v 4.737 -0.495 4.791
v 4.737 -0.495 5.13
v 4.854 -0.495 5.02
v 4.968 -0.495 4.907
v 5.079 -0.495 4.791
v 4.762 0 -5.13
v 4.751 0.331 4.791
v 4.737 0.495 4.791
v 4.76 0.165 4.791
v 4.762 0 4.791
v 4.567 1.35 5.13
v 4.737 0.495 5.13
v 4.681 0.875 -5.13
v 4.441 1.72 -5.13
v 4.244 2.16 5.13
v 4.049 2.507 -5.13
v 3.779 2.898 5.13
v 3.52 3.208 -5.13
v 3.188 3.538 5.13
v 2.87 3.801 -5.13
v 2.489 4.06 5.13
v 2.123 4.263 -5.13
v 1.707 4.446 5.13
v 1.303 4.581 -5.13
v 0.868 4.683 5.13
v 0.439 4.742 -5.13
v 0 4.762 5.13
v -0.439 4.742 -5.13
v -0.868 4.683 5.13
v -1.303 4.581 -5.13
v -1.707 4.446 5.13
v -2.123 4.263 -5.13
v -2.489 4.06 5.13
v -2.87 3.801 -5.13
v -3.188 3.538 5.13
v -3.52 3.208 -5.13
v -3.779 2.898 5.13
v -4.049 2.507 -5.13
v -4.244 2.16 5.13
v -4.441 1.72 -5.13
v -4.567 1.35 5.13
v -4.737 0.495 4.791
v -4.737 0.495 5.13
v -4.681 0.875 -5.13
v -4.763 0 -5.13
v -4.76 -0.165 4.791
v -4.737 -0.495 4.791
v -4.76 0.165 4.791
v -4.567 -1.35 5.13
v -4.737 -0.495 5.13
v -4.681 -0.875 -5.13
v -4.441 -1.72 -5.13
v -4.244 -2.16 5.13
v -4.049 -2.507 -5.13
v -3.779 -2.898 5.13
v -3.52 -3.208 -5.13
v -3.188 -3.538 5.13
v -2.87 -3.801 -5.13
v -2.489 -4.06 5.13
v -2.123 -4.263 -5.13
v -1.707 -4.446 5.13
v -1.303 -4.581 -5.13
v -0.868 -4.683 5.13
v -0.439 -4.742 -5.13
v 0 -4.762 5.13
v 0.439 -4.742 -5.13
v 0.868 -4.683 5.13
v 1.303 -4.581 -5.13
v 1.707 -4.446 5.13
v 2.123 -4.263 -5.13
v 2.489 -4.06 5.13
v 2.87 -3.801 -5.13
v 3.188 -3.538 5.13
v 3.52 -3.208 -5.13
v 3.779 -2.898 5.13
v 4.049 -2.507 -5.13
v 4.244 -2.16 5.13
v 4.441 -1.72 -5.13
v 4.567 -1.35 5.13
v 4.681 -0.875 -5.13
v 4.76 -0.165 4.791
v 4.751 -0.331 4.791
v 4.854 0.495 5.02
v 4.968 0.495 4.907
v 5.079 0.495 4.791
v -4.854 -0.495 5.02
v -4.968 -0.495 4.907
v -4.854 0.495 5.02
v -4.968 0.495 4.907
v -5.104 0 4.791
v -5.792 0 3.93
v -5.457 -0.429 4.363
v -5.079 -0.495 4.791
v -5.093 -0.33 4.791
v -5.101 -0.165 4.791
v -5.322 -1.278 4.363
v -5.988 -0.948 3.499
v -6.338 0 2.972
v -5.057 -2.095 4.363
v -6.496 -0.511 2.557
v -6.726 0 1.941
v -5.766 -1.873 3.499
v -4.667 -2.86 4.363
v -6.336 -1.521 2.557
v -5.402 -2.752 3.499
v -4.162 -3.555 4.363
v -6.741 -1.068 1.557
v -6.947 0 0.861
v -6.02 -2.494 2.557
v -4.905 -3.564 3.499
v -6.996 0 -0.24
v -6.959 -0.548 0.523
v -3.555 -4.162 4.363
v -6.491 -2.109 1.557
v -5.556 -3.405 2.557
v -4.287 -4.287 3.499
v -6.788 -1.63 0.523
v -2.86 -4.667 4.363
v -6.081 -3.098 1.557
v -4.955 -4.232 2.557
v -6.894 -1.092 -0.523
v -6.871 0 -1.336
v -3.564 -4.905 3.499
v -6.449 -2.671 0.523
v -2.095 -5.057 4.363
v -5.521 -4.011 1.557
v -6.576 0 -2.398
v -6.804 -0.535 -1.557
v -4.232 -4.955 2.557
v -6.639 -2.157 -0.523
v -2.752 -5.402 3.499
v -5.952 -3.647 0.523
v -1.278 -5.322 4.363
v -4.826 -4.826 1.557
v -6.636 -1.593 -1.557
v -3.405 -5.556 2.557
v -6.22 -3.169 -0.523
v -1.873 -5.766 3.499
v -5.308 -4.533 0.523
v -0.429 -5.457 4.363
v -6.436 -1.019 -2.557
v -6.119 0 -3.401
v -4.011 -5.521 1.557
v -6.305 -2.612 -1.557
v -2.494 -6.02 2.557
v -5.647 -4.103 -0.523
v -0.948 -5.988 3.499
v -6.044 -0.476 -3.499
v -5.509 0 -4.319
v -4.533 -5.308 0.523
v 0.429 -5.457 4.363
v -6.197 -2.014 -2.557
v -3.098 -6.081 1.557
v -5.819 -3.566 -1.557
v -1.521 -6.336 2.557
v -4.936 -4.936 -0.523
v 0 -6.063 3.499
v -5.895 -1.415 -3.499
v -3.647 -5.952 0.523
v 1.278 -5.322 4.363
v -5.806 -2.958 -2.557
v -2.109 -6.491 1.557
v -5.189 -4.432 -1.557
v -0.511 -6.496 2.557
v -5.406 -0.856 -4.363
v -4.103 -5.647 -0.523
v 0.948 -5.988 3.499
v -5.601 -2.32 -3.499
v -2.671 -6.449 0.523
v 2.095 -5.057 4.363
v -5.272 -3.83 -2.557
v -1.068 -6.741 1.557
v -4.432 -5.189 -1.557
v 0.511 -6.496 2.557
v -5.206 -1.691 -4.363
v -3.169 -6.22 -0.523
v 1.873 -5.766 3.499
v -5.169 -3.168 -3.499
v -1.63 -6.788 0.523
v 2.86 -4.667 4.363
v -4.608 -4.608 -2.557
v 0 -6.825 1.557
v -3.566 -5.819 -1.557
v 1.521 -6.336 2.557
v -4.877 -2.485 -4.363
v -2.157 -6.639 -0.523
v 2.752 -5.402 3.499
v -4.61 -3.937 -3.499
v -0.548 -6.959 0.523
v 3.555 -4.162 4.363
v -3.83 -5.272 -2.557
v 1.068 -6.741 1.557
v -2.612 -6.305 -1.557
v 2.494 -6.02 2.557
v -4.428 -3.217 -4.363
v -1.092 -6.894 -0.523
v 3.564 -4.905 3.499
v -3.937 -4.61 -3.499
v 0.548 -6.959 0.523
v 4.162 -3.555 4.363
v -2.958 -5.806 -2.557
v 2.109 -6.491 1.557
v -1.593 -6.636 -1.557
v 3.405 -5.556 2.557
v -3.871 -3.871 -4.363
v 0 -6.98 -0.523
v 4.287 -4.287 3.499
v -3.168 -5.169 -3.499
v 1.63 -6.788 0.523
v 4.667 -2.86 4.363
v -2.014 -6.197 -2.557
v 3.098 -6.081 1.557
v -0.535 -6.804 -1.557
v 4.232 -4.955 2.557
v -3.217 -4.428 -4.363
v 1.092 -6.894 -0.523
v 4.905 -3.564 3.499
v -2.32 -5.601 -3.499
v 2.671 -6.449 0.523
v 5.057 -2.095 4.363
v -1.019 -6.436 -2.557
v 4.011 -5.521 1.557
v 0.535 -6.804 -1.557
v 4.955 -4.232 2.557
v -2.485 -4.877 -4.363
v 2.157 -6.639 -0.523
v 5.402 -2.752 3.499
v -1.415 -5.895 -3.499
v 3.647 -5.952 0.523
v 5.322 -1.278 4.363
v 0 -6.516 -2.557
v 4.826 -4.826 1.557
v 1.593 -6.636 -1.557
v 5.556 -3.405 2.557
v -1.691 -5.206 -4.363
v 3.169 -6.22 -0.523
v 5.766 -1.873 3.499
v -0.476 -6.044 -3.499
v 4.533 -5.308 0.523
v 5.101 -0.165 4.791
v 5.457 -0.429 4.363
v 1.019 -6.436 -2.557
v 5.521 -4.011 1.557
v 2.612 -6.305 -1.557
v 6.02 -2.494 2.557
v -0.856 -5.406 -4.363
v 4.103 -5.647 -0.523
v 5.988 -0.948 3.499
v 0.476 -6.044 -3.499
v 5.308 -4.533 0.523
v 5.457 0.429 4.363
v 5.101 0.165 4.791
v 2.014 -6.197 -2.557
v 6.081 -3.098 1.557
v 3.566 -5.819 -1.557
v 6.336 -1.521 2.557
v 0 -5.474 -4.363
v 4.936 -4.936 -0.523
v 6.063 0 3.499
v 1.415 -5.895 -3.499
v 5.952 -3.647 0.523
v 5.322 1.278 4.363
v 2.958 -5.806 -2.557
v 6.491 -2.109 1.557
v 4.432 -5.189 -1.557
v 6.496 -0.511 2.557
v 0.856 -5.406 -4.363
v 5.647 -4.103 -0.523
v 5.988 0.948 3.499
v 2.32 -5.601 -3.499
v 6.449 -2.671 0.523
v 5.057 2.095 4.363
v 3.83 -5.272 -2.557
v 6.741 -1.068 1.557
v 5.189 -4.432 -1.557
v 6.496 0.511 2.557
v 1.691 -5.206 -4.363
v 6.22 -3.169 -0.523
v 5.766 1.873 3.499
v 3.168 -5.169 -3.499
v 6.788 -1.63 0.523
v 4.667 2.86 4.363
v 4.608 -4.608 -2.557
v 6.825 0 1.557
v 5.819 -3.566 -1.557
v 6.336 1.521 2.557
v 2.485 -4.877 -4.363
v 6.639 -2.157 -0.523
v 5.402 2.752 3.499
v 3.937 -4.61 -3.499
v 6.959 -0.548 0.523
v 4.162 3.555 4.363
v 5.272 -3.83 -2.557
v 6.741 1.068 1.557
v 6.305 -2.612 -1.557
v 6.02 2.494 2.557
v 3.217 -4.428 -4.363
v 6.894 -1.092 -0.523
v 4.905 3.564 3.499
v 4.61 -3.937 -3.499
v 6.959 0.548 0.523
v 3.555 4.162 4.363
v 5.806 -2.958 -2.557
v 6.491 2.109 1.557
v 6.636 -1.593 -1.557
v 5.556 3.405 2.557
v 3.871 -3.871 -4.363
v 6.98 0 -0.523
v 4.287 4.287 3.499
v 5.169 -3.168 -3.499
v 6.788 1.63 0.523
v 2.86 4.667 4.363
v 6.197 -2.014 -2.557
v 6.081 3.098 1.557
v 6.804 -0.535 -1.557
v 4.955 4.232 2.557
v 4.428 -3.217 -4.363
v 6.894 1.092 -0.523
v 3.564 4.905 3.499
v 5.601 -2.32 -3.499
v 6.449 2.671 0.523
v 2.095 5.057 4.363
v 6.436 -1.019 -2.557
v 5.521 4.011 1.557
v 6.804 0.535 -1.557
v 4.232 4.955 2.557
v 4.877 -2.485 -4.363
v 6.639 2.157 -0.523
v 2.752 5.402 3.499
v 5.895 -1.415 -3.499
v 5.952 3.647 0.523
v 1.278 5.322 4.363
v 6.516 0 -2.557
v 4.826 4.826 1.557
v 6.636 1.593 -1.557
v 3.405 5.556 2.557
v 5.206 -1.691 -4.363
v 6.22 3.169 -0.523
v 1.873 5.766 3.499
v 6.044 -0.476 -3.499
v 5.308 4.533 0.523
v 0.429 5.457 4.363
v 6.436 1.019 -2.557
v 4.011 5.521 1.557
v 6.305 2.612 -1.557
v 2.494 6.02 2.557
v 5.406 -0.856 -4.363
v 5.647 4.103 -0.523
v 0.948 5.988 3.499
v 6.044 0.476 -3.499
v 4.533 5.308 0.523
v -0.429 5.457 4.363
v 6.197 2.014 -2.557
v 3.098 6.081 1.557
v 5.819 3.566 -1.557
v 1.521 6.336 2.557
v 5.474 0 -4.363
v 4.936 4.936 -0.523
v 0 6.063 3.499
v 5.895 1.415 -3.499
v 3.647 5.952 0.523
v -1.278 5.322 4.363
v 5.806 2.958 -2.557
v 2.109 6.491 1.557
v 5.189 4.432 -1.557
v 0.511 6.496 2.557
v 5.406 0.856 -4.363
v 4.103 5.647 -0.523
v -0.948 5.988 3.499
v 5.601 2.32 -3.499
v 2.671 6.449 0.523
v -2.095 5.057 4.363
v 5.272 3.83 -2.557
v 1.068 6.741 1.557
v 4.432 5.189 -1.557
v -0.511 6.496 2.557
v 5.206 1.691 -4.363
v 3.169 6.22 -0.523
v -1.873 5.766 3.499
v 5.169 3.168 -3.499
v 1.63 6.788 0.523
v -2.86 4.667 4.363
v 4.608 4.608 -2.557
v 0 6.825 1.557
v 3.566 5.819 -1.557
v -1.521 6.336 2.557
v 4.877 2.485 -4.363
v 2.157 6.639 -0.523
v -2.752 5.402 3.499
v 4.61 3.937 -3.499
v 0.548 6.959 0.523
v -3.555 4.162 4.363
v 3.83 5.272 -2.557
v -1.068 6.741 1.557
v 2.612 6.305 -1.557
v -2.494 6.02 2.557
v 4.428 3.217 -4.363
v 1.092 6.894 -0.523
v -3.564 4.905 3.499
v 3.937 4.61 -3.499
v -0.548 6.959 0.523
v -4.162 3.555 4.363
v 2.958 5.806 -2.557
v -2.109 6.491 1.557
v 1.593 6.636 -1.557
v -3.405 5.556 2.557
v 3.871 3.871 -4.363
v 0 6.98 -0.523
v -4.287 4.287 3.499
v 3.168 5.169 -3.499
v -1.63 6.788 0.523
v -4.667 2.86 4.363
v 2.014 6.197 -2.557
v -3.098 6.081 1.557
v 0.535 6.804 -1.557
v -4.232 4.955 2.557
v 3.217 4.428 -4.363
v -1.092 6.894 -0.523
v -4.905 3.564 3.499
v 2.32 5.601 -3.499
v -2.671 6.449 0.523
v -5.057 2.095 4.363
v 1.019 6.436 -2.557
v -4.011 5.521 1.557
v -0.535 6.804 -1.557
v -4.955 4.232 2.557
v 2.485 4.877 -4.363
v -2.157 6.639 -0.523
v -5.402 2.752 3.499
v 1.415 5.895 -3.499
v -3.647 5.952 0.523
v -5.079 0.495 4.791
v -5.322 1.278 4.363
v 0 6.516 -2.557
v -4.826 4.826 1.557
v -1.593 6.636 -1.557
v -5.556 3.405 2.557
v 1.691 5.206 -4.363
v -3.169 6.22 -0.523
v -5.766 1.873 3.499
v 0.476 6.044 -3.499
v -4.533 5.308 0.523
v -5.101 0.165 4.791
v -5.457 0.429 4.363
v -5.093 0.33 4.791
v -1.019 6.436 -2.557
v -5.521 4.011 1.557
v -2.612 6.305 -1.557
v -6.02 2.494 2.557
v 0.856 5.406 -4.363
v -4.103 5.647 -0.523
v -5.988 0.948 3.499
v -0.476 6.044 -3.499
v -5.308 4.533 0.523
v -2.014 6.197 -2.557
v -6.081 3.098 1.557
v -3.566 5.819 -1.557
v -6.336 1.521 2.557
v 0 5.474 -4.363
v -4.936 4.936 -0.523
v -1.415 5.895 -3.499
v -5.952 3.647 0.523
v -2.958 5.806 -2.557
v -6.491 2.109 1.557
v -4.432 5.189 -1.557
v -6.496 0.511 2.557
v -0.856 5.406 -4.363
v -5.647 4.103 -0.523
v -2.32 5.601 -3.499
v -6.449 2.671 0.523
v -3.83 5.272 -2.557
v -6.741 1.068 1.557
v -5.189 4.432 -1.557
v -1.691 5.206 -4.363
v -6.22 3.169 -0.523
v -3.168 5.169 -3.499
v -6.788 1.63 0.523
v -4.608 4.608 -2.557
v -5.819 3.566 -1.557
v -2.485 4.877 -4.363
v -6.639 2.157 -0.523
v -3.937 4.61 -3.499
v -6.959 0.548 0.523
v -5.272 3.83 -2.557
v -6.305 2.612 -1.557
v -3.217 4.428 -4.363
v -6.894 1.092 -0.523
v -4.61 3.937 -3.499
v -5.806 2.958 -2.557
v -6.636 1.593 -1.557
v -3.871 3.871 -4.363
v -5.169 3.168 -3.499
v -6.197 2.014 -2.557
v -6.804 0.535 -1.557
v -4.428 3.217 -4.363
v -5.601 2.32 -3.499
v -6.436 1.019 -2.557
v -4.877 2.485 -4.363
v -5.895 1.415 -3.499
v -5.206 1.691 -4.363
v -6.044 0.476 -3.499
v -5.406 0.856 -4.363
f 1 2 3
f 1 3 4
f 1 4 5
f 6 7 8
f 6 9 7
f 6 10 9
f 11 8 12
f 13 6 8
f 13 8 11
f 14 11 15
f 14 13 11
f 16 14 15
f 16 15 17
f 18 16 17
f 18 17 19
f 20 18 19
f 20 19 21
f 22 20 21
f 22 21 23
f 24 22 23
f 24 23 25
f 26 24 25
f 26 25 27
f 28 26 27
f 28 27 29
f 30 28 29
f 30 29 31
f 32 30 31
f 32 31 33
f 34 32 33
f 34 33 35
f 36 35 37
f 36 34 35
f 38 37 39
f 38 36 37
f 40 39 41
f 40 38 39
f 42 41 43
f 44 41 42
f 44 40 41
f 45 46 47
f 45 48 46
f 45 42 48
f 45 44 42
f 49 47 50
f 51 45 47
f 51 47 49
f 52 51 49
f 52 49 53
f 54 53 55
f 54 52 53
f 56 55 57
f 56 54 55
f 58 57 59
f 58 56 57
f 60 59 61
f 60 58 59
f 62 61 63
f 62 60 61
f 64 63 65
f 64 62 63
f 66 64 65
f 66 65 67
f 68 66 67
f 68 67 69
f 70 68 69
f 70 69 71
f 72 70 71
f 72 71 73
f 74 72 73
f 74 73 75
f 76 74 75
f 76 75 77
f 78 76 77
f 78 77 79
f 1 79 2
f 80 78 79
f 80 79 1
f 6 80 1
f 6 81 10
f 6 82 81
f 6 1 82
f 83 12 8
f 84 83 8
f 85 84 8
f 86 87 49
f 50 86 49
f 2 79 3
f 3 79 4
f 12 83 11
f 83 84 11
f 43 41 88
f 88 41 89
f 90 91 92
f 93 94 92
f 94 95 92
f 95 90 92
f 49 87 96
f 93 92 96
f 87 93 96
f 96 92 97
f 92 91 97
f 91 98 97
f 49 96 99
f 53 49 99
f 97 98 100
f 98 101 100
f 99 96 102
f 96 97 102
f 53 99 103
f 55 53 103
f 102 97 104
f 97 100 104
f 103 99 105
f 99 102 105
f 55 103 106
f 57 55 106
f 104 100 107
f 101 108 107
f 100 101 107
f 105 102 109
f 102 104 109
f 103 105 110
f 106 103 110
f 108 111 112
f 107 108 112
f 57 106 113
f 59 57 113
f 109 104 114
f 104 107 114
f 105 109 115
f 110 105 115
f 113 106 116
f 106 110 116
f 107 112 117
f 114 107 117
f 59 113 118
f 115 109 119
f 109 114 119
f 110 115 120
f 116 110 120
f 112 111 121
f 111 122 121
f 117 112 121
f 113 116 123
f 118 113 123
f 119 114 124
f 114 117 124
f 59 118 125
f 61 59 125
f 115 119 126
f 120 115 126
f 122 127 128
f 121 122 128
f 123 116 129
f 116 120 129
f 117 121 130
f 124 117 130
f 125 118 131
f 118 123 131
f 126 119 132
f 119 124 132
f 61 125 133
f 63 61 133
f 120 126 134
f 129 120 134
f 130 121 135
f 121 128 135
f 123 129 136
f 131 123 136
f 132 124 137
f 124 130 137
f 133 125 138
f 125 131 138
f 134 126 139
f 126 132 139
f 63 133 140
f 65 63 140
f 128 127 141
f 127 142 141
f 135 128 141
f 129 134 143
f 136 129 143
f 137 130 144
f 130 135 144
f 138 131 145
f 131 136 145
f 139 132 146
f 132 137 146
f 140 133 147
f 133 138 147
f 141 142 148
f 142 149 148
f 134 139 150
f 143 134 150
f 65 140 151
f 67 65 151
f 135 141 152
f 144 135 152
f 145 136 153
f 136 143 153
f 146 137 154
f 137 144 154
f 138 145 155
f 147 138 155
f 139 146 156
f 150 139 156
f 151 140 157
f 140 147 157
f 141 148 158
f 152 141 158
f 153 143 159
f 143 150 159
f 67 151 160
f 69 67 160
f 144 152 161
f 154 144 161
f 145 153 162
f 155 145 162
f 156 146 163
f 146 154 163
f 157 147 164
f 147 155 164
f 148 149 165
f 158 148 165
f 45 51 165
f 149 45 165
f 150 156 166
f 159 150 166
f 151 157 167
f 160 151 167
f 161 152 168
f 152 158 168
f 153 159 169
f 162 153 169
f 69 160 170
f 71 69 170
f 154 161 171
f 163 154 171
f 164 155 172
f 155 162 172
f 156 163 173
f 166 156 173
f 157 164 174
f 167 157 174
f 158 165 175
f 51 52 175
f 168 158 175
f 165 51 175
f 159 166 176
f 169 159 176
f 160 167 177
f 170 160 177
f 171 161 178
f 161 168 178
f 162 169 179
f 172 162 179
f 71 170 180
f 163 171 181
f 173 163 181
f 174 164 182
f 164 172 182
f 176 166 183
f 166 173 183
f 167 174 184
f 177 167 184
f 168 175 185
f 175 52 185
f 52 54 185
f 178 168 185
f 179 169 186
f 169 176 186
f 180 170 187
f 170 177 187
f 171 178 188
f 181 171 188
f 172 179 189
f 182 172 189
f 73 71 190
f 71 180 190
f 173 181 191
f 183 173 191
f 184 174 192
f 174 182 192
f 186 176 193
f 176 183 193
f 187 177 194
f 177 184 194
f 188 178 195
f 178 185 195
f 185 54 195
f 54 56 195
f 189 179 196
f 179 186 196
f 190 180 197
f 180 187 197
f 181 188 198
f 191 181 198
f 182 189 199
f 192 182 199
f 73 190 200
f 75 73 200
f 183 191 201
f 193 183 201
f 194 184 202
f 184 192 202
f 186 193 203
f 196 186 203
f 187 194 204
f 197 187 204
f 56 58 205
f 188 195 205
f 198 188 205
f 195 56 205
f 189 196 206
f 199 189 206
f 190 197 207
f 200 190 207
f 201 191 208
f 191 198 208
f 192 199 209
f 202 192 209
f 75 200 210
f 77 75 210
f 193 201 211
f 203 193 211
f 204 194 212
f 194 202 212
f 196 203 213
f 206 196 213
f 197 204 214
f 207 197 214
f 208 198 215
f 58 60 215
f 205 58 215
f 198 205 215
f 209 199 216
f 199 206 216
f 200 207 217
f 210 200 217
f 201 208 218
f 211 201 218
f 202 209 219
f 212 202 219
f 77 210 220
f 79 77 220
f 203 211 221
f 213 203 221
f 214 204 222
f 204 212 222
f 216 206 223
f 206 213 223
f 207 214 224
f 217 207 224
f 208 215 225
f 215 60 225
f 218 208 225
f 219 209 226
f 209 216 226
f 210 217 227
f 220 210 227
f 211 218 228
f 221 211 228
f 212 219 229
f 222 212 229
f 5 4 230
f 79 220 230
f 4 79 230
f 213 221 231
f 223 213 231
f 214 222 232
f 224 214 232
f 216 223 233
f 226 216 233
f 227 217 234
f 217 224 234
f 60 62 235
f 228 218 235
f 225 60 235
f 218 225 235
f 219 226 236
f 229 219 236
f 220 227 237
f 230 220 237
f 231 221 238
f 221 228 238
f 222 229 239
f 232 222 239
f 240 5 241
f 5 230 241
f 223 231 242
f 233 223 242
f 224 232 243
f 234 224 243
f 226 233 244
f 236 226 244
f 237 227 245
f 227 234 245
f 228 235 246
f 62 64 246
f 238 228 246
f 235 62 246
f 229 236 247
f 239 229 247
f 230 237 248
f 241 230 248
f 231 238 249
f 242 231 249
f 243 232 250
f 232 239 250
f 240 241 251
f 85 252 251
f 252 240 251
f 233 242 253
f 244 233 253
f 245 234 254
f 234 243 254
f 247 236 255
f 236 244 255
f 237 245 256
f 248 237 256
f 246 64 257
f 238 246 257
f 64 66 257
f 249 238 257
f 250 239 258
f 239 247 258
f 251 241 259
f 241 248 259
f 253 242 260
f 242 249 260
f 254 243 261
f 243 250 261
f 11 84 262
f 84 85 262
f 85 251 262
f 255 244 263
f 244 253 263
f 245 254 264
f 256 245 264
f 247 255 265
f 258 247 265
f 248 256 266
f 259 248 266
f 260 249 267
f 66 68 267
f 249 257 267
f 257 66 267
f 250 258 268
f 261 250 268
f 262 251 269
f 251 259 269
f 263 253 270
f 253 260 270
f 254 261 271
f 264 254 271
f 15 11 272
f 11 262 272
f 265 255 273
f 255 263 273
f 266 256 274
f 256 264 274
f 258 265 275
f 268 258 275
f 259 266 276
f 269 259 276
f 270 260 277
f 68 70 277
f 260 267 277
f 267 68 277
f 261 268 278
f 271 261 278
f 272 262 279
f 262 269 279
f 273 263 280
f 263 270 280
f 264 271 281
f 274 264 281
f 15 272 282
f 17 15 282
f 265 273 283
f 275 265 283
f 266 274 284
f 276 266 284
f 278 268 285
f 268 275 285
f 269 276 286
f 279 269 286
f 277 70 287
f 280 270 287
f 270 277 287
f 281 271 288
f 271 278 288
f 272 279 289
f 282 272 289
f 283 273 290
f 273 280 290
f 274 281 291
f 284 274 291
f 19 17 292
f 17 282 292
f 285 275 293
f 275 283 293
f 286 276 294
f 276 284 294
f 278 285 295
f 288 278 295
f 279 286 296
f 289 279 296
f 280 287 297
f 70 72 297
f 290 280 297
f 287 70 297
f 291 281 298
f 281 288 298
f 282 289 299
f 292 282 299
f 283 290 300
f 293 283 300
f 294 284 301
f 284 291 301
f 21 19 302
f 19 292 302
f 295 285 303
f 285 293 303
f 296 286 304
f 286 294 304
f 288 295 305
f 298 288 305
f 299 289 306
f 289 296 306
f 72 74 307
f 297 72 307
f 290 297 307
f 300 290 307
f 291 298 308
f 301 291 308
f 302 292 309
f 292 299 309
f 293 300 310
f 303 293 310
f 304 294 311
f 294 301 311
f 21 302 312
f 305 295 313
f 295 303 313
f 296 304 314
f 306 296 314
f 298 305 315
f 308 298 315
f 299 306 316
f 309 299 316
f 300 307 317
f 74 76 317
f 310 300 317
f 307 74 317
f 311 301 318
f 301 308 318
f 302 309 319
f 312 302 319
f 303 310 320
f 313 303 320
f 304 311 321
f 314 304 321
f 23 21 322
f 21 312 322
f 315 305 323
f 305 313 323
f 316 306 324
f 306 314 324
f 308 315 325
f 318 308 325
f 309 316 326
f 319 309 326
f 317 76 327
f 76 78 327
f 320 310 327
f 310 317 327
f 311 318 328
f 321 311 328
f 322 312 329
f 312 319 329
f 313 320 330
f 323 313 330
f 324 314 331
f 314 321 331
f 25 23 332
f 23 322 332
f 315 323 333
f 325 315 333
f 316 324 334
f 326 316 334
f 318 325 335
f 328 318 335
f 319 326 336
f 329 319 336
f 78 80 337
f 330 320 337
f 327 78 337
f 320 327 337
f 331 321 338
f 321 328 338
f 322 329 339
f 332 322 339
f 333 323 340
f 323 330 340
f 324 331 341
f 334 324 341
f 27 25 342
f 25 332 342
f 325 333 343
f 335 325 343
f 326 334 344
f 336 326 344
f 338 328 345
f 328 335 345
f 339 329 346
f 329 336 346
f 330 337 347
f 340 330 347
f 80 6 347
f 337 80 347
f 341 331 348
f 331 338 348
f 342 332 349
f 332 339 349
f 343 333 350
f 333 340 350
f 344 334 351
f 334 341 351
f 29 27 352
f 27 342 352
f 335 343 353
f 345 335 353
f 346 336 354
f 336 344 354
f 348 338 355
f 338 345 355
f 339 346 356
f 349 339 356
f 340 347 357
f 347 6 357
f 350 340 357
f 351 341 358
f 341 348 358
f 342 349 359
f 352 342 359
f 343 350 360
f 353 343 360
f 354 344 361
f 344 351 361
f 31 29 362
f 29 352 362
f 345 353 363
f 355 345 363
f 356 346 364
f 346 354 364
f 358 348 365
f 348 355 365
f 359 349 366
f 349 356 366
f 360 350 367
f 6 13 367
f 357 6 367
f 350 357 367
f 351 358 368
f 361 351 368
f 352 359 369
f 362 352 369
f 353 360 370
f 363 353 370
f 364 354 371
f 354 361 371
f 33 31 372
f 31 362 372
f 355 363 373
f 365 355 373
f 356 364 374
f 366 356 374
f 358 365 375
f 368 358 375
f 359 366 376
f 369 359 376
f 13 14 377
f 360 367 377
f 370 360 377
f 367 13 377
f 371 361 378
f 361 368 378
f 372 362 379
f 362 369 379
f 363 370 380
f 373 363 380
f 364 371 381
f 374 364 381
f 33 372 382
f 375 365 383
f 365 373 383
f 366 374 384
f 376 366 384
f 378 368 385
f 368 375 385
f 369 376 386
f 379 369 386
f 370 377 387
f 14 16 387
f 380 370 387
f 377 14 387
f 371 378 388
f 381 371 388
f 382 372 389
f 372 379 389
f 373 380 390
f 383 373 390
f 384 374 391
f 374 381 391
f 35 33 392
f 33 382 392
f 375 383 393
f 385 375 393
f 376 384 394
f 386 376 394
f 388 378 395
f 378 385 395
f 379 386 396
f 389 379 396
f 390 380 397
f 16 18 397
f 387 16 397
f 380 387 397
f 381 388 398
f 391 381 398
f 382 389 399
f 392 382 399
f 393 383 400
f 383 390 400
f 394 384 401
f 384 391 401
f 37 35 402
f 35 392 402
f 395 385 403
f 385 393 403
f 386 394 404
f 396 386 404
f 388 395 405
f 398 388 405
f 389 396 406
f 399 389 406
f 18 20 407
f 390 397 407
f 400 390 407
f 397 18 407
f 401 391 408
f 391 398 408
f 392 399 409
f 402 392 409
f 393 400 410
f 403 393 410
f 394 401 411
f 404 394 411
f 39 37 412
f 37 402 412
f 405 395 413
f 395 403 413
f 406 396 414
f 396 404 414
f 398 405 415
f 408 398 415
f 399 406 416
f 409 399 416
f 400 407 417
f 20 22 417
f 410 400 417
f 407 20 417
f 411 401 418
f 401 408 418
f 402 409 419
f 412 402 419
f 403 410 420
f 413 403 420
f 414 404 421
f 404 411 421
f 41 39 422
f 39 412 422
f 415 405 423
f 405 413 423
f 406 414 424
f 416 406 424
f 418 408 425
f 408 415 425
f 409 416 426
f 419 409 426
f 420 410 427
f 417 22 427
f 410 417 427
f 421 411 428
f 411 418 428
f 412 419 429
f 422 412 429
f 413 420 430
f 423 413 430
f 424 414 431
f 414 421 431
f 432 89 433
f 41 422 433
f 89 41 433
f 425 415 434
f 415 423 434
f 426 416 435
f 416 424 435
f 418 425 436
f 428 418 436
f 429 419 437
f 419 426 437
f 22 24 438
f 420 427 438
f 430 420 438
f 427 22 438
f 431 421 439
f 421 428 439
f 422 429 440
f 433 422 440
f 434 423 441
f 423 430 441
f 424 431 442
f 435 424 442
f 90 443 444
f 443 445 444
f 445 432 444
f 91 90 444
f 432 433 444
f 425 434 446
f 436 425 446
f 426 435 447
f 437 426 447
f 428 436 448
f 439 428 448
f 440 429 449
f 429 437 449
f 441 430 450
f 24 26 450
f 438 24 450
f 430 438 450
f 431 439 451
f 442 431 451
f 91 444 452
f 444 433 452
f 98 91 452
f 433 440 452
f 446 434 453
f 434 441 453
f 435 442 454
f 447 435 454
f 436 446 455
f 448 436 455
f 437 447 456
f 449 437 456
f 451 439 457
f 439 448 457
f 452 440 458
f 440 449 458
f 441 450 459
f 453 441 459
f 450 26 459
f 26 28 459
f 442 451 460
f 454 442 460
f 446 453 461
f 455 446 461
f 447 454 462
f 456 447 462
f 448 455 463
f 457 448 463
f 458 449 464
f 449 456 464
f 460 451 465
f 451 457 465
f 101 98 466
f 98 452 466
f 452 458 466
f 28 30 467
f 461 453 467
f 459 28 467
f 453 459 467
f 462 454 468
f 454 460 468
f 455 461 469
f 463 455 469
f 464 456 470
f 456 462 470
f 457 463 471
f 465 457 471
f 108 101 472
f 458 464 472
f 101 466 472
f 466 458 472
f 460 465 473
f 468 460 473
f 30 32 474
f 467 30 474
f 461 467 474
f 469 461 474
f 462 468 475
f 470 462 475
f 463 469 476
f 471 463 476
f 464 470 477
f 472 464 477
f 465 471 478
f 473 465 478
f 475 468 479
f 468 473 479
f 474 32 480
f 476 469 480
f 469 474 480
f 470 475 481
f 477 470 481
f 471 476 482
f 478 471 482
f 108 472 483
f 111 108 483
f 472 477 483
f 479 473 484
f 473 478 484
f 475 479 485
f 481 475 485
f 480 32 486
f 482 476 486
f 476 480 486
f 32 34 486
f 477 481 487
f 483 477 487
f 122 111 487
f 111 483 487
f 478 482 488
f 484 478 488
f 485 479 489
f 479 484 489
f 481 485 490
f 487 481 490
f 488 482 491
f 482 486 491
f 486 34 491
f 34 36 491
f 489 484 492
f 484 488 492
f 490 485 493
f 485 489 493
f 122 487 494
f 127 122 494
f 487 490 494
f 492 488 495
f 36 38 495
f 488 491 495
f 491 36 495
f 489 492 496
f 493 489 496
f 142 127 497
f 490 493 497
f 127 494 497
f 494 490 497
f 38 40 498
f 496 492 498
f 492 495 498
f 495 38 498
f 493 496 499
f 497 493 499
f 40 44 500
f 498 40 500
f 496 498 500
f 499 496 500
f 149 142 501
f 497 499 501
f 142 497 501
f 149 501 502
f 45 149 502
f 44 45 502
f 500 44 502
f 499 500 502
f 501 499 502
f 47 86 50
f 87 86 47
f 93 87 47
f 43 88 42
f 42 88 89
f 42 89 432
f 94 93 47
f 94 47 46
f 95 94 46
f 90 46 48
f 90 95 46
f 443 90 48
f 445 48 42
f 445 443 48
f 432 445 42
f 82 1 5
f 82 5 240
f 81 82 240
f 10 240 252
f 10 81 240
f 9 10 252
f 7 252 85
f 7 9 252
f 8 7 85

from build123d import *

# Parameters (mm, degrees)
CUT_EXTRUDE1_DEPTH      = 13.124355653
CUT_EXTRUDE1_DEPTH_BACK = 13.124355653
SKETCH2_R               = 4.7625
CUT_EXTRUDE2_DEPTH      = 12.14982483
CUT_EXTRUDE2_DEPTH_BACK = 12.14982483
SKETCH3_W               = 0.678207446
SKETCH3_H               = 0.99055699


with BuildPart() as part:
    # Sketch1 → Revolve1 (revolve)
    with BuildSketch(Plane(origin=(0, 0, 0), x_dir=(1, 0, 0), z_dir=(0, 1, 0))):
        with BuildLine():
            Line((0, 7), (0, -7))
            ThreePointArc((0, -7), (-7, 0), (0, 7))
        make_face()
    revolve(axis=Axis((0, 0, -7), (0, 0, 1)))

    # Sketch2 → Cut-Extrude1 (cut, two sides: drawn at the far end of the back side and taken through both)
    with BuildSketch(Plane.XY.offset(-CUT_EXTRUDE1_DEPTH_BACK)):
        Circle(SKETCH2_R)
    extrude(amount=CUT_EXTRUDE1_DEPTH + CUT_EXTRUDE1_DEPTH_BACK, mode=Mode.SUBTRACT)

    # Sketch3 → Cut-Extrude2 (cut, two sides: drawn at the far end of the back side and taken through both)
    with BuildSketch(Plane(origin=(0, 0, 0), x_dir=(0, 0, -1), z_dir=(1, 0, 0)).offset(-CUT_EXTRUDE2_DEPTH_BACK)):
        with Locations((-5.13016508, 0)):
            Rectangle(SKETCH3_W, SKETCH3_H)
    extrude(amount=CUT_EXTRUDE2_DEPTH + CUT_EXTRUDE2_DEPTH_BACK, mode=Mode.SUBTRACT)


solid = part.part
